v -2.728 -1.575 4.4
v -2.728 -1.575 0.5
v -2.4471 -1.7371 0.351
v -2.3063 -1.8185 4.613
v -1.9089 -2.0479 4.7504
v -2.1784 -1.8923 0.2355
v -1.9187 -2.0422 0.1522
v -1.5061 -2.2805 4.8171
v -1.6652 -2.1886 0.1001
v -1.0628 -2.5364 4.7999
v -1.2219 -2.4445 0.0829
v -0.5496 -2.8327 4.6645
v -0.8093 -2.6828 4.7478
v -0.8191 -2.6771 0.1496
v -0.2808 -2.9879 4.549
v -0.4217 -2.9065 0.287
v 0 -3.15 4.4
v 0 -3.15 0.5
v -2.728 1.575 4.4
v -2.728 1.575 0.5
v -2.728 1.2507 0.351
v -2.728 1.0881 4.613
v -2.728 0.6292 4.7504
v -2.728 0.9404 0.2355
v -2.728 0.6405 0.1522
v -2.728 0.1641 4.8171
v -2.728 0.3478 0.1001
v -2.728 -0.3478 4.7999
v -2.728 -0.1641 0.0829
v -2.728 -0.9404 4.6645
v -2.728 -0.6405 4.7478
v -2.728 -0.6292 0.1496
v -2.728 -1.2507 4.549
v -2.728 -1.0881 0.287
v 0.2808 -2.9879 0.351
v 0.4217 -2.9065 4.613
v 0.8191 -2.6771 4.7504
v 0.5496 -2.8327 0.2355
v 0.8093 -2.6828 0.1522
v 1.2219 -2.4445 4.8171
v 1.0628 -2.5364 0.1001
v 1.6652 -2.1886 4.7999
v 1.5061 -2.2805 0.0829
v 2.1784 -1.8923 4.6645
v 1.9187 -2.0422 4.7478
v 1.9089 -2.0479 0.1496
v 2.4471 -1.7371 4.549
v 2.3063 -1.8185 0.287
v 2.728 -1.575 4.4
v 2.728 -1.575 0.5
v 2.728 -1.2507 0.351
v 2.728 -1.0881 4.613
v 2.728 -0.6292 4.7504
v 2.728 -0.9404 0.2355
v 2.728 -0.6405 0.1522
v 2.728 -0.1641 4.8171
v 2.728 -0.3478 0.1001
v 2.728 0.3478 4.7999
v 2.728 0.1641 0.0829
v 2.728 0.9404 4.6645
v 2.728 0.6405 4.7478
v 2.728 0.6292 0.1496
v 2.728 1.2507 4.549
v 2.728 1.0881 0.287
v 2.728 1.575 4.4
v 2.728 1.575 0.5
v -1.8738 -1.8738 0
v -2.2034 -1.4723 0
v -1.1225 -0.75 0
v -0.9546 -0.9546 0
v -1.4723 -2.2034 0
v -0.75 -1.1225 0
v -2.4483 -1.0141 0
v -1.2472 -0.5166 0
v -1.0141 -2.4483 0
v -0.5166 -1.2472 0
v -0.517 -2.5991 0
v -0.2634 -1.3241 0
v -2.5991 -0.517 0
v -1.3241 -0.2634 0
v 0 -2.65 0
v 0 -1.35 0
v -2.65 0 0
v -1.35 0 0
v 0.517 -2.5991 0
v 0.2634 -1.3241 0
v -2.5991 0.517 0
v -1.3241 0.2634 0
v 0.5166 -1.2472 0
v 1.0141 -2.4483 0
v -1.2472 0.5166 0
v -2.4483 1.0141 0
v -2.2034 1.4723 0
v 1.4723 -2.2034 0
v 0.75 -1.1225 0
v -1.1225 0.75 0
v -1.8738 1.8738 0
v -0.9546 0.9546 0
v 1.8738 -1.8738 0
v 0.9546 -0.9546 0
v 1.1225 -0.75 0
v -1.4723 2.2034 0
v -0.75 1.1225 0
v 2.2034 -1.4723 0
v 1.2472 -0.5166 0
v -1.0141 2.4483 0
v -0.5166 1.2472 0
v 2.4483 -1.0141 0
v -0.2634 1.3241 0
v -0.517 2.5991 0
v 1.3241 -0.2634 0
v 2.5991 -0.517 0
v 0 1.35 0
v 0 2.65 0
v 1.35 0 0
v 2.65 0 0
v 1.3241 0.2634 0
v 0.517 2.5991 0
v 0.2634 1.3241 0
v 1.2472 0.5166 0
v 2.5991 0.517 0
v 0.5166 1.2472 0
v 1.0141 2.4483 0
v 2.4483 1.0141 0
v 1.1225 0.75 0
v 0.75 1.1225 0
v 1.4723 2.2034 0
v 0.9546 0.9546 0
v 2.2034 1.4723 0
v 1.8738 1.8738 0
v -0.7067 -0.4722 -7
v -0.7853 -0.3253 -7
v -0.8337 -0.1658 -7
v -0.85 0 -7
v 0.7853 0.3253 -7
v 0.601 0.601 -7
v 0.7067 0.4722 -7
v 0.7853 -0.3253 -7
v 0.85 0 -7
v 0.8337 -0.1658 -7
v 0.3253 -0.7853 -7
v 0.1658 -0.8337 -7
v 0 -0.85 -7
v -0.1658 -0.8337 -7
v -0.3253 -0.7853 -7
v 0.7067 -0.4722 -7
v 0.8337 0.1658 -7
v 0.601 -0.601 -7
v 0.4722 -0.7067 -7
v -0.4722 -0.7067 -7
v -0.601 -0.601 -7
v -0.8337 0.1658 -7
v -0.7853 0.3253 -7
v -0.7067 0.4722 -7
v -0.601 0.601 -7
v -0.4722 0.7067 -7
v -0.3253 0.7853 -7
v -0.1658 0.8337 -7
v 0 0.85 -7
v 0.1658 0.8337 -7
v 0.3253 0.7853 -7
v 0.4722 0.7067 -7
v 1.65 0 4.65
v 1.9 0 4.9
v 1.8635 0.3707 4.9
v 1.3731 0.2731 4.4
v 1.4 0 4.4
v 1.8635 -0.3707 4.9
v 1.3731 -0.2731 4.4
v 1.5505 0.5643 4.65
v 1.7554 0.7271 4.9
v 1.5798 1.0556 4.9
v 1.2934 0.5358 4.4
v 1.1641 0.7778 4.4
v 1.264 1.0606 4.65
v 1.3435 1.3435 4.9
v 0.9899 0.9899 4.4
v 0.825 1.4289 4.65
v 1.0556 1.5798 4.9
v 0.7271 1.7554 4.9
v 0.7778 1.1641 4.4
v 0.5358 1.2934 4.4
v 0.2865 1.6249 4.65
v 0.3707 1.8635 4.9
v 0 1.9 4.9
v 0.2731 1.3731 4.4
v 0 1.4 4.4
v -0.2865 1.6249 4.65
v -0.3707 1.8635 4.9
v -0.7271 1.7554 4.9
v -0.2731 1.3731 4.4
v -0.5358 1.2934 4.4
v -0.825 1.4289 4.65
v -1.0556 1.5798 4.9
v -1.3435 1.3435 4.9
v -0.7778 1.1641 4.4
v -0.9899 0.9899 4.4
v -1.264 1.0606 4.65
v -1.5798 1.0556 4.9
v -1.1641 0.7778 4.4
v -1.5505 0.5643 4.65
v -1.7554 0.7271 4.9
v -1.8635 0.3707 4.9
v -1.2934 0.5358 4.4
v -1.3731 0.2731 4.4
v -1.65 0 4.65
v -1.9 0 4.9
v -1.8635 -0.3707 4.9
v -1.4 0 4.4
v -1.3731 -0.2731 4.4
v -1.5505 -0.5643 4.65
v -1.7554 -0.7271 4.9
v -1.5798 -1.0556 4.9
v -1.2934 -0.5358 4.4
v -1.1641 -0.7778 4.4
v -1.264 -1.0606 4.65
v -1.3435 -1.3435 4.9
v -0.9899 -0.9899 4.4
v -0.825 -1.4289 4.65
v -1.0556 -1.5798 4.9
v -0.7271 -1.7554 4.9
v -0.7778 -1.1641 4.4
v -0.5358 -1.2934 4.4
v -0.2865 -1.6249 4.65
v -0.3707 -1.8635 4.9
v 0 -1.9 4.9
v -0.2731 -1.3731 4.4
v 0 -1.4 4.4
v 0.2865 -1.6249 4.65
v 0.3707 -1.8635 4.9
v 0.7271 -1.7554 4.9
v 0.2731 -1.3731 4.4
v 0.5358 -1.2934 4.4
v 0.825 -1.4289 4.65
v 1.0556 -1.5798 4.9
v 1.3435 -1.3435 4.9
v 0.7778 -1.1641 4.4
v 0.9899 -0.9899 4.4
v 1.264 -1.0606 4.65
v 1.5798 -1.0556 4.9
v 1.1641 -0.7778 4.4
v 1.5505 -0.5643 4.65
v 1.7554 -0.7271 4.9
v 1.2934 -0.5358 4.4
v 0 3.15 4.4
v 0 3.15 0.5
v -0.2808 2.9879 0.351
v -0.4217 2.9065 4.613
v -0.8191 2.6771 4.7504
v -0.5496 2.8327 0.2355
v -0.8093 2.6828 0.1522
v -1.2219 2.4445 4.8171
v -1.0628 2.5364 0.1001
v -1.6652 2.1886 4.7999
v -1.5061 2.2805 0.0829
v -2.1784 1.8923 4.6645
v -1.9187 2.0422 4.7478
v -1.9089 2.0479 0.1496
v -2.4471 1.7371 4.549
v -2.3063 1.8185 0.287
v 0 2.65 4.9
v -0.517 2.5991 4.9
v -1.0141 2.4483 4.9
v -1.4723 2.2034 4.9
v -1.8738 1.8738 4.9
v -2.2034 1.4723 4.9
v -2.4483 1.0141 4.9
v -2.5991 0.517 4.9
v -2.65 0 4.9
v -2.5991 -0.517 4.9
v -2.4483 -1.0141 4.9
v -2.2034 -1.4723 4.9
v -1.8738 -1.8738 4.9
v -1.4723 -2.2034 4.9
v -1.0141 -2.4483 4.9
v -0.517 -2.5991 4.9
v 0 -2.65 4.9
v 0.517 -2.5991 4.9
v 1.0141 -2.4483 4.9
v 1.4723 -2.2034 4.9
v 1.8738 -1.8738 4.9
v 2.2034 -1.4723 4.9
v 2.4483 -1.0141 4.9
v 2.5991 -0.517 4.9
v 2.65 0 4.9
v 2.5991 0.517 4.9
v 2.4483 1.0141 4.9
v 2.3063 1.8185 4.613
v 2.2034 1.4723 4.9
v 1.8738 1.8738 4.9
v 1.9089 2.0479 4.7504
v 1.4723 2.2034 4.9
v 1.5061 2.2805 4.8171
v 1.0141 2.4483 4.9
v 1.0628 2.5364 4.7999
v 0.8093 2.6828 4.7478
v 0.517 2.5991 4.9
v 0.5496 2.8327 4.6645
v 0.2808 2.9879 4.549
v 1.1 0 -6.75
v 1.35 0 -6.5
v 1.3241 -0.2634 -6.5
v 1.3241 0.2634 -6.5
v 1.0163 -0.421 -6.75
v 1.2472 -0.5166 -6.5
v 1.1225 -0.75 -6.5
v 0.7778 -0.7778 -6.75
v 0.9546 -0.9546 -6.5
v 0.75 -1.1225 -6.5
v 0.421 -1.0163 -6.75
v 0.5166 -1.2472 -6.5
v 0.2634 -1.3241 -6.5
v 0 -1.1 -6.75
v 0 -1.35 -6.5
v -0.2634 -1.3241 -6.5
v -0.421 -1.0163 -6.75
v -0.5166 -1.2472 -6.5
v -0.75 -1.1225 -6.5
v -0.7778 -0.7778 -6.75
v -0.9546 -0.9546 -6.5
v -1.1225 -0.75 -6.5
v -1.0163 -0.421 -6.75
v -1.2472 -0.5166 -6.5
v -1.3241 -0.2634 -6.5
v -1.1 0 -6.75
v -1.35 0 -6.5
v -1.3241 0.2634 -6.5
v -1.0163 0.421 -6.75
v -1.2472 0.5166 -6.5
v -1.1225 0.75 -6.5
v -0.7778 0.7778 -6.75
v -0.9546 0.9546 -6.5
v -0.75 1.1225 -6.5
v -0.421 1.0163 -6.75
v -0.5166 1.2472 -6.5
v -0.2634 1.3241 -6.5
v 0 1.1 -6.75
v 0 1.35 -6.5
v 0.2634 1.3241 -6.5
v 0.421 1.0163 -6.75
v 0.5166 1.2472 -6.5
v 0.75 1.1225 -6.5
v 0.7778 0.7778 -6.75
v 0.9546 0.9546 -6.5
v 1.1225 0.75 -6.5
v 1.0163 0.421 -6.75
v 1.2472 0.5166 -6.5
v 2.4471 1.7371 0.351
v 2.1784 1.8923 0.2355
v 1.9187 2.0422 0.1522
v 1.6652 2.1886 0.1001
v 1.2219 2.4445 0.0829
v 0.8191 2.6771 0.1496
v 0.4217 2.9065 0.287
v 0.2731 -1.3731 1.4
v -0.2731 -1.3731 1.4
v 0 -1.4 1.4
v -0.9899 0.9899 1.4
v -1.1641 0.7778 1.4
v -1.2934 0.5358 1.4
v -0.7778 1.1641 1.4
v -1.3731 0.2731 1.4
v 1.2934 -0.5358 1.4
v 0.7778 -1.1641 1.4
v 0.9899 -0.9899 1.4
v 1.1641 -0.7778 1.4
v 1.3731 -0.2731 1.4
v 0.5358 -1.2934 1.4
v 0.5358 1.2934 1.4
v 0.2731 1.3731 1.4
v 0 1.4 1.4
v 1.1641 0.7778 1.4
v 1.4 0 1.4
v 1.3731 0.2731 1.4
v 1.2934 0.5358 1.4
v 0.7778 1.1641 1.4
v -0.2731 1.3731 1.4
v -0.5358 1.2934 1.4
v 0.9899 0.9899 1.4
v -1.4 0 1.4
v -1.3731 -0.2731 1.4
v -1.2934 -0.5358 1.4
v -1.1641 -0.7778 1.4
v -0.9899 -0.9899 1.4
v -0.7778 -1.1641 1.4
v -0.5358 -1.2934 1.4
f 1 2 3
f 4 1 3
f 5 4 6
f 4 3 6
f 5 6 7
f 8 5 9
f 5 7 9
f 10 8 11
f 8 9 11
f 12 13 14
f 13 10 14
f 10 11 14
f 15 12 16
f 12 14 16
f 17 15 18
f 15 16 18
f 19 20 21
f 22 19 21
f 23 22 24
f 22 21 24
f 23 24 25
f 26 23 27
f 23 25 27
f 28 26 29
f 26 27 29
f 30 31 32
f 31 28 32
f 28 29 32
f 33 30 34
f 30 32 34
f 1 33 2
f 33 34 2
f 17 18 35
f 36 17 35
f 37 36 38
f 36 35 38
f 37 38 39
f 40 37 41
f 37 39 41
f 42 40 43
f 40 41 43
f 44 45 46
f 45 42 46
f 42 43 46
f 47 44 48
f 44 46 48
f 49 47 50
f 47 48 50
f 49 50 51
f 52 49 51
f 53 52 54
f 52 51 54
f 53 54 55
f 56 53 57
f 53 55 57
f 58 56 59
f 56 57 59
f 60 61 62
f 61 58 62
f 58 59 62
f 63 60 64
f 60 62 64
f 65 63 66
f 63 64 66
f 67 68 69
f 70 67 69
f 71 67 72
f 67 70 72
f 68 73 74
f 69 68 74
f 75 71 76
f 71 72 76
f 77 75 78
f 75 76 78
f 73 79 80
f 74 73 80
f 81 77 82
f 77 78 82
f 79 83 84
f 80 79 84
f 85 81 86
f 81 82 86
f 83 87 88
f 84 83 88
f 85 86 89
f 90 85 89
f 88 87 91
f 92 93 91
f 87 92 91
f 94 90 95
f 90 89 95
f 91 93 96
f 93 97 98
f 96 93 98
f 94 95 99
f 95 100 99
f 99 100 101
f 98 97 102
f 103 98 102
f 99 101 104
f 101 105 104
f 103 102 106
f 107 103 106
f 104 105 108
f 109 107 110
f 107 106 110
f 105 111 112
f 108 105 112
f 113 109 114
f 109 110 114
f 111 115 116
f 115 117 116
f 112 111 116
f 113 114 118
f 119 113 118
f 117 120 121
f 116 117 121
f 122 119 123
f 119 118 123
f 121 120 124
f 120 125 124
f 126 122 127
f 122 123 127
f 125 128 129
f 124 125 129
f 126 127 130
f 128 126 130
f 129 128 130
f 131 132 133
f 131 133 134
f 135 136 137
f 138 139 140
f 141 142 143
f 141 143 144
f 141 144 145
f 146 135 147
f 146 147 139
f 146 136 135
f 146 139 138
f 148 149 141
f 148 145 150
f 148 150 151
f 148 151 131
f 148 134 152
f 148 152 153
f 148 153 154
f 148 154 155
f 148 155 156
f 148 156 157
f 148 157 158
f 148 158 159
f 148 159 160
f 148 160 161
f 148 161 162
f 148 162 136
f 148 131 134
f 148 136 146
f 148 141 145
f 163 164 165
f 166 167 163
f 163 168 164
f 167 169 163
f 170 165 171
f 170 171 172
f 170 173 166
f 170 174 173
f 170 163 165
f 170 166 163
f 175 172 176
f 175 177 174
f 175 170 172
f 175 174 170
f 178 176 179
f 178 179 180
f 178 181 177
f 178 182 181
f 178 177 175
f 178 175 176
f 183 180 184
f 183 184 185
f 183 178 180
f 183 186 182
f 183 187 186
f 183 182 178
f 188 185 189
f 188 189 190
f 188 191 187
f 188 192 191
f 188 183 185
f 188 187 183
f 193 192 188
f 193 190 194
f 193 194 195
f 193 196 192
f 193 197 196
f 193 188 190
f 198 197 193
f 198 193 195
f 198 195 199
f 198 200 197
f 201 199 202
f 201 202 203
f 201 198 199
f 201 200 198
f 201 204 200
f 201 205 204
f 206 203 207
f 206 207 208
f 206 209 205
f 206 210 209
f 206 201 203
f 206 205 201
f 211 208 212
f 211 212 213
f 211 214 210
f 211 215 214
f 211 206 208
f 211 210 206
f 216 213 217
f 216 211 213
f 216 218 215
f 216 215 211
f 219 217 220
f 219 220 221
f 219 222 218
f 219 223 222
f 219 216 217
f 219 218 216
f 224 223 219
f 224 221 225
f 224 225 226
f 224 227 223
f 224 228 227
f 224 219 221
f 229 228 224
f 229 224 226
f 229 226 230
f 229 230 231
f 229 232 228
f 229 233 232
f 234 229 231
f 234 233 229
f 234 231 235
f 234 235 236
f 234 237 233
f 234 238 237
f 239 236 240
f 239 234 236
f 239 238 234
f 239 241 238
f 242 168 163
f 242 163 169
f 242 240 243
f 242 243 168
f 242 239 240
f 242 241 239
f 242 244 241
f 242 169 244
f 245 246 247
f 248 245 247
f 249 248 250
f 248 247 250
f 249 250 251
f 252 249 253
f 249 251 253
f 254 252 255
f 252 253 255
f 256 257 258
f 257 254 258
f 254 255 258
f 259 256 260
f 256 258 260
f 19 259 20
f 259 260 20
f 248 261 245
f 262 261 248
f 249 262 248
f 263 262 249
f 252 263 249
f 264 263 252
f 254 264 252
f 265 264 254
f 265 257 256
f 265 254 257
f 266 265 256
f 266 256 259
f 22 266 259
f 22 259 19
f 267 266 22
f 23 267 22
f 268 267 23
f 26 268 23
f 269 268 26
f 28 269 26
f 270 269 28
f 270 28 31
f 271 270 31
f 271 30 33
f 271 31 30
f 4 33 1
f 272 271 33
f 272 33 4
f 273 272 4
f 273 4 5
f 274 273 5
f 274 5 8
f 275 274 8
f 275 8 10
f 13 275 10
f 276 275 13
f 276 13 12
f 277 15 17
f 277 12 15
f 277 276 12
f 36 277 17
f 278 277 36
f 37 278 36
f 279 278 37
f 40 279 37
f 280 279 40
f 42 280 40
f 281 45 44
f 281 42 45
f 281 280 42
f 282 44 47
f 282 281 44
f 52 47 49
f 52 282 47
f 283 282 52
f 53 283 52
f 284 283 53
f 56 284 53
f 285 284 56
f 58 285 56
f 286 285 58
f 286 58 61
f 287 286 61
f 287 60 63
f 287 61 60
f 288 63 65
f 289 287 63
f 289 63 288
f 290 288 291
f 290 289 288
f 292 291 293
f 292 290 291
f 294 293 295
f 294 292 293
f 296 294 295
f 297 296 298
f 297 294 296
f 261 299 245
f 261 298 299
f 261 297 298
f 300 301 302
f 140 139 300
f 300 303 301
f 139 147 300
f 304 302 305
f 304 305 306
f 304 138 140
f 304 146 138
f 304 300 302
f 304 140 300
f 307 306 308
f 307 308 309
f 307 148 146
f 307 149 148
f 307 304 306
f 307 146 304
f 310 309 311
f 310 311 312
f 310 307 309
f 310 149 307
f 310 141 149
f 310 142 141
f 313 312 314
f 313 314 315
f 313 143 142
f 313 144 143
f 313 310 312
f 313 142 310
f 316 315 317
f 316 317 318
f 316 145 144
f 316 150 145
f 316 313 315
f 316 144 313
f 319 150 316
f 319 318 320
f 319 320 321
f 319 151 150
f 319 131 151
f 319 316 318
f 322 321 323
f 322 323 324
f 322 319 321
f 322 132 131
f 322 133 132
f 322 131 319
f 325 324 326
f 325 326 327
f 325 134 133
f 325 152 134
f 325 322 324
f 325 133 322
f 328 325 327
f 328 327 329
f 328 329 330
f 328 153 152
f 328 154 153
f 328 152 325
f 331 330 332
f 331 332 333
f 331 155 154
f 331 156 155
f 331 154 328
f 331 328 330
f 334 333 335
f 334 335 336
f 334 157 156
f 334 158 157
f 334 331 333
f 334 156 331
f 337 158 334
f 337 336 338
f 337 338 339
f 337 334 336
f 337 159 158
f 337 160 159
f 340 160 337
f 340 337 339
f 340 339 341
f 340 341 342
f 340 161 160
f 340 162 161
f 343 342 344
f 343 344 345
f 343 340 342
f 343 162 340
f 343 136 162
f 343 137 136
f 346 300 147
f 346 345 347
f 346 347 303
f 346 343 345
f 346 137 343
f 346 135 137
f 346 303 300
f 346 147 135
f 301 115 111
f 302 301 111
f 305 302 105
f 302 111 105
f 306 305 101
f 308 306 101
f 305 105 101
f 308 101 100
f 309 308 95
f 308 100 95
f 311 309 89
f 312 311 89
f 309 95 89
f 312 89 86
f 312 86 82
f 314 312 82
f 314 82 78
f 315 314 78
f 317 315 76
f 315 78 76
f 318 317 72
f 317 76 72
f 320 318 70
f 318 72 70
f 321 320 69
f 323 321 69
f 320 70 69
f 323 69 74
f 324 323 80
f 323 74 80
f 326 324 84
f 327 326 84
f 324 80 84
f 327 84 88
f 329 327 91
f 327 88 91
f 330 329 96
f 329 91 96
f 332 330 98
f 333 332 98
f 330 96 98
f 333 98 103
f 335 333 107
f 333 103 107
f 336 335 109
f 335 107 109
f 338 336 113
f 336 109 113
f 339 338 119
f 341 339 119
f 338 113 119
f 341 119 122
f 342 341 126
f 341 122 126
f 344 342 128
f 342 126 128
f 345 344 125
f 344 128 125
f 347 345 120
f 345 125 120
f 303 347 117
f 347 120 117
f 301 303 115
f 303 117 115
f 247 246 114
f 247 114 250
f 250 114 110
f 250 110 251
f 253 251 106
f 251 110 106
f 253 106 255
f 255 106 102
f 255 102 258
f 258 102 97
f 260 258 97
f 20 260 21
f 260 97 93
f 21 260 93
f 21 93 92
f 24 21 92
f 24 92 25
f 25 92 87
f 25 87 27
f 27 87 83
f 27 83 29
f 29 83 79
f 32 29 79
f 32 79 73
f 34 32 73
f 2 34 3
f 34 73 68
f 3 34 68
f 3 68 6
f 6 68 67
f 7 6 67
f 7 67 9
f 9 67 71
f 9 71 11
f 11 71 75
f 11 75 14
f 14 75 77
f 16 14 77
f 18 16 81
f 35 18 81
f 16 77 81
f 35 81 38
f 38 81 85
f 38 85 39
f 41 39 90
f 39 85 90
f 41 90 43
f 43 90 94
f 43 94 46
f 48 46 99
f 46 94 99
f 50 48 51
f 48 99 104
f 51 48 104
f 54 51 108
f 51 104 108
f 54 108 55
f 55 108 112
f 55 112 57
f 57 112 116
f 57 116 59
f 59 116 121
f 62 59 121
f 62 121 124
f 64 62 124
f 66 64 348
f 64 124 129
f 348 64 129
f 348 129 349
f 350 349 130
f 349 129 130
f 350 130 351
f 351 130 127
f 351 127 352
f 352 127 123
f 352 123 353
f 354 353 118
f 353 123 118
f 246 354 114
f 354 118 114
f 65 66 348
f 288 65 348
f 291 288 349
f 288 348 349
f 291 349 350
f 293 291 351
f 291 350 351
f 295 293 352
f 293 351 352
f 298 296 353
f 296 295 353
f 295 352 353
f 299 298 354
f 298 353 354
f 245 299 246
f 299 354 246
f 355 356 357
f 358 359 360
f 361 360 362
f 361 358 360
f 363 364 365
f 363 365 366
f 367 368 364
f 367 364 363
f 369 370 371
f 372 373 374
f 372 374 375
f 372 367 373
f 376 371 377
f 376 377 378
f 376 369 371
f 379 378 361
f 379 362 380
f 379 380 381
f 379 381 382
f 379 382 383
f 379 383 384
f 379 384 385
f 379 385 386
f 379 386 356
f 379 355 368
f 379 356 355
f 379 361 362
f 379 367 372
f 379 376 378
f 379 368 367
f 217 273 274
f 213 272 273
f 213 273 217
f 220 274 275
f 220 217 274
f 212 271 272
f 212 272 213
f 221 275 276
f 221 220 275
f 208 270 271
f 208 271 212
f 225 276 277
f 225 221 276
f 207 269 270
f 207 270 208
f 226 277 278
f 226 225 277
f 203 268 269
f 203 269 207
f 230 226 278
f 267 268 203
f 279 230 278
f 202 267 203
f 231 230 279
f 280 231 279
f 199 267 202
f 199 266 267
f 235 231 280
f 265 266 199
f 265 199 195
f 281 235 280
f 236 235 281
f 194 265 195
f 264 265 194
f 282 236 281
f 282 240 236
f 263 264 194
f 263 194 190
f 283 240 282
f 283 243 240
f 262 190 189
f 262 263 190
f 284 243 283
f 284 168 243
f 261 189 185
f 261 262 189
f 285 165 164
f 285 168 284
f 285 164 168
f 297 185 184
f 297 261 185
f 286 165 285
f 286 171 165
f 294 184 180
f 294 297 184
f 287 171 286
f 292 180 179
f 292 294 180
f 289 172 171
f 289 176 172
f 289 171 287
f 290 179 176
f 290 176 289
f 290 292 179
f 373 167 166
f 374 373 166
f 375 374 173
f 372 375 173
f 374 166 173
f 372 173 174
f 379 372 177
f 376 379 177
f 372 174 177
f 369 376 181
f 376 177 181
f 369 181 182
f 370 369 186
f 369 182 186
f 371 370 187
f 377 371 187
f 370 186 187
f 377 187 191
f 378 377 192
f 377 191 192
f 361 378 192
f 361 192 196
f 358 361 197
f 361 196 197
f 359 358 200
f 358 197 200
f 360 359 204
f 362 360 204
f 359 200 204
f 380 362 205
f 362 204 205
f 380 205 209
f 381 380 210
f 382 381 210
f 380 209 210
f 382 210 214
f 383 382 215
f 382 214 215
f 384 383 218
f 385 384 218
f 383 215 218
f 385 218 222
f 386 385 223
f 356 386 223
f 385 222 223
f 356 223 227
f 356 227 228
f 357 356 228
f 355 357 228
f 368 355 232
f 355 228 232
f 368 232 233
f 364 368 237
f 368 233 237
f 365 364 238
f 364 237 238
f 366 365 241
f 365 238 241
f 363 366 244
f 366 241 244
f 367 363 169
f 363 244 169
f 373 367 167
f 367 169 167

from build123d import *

# Parameters (mm, degrees)
RESSALTO_EXTRUS_O1_DEPTH = 4.9
ESBO_O10_R               = 1.35
RESSALTO_EXTRUS_O2_DEPTH = 7
ESBO_O11_R               = 1.4
CORTE_EXTRUS_O1_DEPTH    = 3.5
CHANFRO1_SIZE            = 0.5
CHANFRO2_SIZE            = 0.5


with BuildPart() as part:
    # Esboço1 → Ressalto-extrusão1 (new body)
    with BuildSketch(Plane.XY):
        Polygon((-2.727980022, 1.575), (-2.727980022, -1.575), (0, -3.15), (2.727980022, -1.575), (2.727980022, 1.575), (0, 3.15), align=None)
    extrude(amount=RESSALTO_EXTRUS_O1_DEPTH)

    # Esboço8 → Corte-Revolução1 (revolve, cut)
    with BuildSketch(Plane(origin=(0, 0, 0), x_dir=(0, 0, -1), z_dir=(1, 0, 0))):
        Polygon((-4.4, 3.15), (-4.9, 2.65), (-4.9, 3.15), align=None)
        Polygon((0, 3.15), (-0.5, 3.15), (0, 2.65), align=None)
    revolve(axis=Axis((0, 0, 0), (0, 0, 1)), mode=Mode.SUBTRACT)

    # Esboço10 → Ressalto-extrusão2 (add)
    with BuildSketch(Plane(origin=(0, 0, 0), x_dir=(-1, 0, 0), z_dir=(0, 0, -1))):
        with Locations(Location((0, 0, 0), (0, 0, 180))):
            Circle(ESBO_O10_R)
    extrude(amount=RESSALTO_EXTRUS_O2_DEPTH)

    # Esboço11 → Corte-extrusão1 (cut)
    with BuildSketch(Plane.XY.offset(4.9)):
        Circle(ESBO_O11_R)
    extrude(amount=-CORTE_EXTRUS_O1_DEPTH, mode=Mode.SUBTRACT)

    # Chanfro1
    chanfro1_edges = [part.edges().sort_by_distance(p)[0] for p in [
        (-1.4, 0, 4.9),
    ]]
    chamfer(chanfro1_edges, length=CHANFRO1_SIZE)

    # Chanfro2
    chanfro2_edges = [part.edges().sort_by_distance(p)[0] for p in [
        (-1.35, 0, -7),
    ]]
    chamfer(chanfro2_edges, length=CHANFRO2_SIZE)


solid = part.part
